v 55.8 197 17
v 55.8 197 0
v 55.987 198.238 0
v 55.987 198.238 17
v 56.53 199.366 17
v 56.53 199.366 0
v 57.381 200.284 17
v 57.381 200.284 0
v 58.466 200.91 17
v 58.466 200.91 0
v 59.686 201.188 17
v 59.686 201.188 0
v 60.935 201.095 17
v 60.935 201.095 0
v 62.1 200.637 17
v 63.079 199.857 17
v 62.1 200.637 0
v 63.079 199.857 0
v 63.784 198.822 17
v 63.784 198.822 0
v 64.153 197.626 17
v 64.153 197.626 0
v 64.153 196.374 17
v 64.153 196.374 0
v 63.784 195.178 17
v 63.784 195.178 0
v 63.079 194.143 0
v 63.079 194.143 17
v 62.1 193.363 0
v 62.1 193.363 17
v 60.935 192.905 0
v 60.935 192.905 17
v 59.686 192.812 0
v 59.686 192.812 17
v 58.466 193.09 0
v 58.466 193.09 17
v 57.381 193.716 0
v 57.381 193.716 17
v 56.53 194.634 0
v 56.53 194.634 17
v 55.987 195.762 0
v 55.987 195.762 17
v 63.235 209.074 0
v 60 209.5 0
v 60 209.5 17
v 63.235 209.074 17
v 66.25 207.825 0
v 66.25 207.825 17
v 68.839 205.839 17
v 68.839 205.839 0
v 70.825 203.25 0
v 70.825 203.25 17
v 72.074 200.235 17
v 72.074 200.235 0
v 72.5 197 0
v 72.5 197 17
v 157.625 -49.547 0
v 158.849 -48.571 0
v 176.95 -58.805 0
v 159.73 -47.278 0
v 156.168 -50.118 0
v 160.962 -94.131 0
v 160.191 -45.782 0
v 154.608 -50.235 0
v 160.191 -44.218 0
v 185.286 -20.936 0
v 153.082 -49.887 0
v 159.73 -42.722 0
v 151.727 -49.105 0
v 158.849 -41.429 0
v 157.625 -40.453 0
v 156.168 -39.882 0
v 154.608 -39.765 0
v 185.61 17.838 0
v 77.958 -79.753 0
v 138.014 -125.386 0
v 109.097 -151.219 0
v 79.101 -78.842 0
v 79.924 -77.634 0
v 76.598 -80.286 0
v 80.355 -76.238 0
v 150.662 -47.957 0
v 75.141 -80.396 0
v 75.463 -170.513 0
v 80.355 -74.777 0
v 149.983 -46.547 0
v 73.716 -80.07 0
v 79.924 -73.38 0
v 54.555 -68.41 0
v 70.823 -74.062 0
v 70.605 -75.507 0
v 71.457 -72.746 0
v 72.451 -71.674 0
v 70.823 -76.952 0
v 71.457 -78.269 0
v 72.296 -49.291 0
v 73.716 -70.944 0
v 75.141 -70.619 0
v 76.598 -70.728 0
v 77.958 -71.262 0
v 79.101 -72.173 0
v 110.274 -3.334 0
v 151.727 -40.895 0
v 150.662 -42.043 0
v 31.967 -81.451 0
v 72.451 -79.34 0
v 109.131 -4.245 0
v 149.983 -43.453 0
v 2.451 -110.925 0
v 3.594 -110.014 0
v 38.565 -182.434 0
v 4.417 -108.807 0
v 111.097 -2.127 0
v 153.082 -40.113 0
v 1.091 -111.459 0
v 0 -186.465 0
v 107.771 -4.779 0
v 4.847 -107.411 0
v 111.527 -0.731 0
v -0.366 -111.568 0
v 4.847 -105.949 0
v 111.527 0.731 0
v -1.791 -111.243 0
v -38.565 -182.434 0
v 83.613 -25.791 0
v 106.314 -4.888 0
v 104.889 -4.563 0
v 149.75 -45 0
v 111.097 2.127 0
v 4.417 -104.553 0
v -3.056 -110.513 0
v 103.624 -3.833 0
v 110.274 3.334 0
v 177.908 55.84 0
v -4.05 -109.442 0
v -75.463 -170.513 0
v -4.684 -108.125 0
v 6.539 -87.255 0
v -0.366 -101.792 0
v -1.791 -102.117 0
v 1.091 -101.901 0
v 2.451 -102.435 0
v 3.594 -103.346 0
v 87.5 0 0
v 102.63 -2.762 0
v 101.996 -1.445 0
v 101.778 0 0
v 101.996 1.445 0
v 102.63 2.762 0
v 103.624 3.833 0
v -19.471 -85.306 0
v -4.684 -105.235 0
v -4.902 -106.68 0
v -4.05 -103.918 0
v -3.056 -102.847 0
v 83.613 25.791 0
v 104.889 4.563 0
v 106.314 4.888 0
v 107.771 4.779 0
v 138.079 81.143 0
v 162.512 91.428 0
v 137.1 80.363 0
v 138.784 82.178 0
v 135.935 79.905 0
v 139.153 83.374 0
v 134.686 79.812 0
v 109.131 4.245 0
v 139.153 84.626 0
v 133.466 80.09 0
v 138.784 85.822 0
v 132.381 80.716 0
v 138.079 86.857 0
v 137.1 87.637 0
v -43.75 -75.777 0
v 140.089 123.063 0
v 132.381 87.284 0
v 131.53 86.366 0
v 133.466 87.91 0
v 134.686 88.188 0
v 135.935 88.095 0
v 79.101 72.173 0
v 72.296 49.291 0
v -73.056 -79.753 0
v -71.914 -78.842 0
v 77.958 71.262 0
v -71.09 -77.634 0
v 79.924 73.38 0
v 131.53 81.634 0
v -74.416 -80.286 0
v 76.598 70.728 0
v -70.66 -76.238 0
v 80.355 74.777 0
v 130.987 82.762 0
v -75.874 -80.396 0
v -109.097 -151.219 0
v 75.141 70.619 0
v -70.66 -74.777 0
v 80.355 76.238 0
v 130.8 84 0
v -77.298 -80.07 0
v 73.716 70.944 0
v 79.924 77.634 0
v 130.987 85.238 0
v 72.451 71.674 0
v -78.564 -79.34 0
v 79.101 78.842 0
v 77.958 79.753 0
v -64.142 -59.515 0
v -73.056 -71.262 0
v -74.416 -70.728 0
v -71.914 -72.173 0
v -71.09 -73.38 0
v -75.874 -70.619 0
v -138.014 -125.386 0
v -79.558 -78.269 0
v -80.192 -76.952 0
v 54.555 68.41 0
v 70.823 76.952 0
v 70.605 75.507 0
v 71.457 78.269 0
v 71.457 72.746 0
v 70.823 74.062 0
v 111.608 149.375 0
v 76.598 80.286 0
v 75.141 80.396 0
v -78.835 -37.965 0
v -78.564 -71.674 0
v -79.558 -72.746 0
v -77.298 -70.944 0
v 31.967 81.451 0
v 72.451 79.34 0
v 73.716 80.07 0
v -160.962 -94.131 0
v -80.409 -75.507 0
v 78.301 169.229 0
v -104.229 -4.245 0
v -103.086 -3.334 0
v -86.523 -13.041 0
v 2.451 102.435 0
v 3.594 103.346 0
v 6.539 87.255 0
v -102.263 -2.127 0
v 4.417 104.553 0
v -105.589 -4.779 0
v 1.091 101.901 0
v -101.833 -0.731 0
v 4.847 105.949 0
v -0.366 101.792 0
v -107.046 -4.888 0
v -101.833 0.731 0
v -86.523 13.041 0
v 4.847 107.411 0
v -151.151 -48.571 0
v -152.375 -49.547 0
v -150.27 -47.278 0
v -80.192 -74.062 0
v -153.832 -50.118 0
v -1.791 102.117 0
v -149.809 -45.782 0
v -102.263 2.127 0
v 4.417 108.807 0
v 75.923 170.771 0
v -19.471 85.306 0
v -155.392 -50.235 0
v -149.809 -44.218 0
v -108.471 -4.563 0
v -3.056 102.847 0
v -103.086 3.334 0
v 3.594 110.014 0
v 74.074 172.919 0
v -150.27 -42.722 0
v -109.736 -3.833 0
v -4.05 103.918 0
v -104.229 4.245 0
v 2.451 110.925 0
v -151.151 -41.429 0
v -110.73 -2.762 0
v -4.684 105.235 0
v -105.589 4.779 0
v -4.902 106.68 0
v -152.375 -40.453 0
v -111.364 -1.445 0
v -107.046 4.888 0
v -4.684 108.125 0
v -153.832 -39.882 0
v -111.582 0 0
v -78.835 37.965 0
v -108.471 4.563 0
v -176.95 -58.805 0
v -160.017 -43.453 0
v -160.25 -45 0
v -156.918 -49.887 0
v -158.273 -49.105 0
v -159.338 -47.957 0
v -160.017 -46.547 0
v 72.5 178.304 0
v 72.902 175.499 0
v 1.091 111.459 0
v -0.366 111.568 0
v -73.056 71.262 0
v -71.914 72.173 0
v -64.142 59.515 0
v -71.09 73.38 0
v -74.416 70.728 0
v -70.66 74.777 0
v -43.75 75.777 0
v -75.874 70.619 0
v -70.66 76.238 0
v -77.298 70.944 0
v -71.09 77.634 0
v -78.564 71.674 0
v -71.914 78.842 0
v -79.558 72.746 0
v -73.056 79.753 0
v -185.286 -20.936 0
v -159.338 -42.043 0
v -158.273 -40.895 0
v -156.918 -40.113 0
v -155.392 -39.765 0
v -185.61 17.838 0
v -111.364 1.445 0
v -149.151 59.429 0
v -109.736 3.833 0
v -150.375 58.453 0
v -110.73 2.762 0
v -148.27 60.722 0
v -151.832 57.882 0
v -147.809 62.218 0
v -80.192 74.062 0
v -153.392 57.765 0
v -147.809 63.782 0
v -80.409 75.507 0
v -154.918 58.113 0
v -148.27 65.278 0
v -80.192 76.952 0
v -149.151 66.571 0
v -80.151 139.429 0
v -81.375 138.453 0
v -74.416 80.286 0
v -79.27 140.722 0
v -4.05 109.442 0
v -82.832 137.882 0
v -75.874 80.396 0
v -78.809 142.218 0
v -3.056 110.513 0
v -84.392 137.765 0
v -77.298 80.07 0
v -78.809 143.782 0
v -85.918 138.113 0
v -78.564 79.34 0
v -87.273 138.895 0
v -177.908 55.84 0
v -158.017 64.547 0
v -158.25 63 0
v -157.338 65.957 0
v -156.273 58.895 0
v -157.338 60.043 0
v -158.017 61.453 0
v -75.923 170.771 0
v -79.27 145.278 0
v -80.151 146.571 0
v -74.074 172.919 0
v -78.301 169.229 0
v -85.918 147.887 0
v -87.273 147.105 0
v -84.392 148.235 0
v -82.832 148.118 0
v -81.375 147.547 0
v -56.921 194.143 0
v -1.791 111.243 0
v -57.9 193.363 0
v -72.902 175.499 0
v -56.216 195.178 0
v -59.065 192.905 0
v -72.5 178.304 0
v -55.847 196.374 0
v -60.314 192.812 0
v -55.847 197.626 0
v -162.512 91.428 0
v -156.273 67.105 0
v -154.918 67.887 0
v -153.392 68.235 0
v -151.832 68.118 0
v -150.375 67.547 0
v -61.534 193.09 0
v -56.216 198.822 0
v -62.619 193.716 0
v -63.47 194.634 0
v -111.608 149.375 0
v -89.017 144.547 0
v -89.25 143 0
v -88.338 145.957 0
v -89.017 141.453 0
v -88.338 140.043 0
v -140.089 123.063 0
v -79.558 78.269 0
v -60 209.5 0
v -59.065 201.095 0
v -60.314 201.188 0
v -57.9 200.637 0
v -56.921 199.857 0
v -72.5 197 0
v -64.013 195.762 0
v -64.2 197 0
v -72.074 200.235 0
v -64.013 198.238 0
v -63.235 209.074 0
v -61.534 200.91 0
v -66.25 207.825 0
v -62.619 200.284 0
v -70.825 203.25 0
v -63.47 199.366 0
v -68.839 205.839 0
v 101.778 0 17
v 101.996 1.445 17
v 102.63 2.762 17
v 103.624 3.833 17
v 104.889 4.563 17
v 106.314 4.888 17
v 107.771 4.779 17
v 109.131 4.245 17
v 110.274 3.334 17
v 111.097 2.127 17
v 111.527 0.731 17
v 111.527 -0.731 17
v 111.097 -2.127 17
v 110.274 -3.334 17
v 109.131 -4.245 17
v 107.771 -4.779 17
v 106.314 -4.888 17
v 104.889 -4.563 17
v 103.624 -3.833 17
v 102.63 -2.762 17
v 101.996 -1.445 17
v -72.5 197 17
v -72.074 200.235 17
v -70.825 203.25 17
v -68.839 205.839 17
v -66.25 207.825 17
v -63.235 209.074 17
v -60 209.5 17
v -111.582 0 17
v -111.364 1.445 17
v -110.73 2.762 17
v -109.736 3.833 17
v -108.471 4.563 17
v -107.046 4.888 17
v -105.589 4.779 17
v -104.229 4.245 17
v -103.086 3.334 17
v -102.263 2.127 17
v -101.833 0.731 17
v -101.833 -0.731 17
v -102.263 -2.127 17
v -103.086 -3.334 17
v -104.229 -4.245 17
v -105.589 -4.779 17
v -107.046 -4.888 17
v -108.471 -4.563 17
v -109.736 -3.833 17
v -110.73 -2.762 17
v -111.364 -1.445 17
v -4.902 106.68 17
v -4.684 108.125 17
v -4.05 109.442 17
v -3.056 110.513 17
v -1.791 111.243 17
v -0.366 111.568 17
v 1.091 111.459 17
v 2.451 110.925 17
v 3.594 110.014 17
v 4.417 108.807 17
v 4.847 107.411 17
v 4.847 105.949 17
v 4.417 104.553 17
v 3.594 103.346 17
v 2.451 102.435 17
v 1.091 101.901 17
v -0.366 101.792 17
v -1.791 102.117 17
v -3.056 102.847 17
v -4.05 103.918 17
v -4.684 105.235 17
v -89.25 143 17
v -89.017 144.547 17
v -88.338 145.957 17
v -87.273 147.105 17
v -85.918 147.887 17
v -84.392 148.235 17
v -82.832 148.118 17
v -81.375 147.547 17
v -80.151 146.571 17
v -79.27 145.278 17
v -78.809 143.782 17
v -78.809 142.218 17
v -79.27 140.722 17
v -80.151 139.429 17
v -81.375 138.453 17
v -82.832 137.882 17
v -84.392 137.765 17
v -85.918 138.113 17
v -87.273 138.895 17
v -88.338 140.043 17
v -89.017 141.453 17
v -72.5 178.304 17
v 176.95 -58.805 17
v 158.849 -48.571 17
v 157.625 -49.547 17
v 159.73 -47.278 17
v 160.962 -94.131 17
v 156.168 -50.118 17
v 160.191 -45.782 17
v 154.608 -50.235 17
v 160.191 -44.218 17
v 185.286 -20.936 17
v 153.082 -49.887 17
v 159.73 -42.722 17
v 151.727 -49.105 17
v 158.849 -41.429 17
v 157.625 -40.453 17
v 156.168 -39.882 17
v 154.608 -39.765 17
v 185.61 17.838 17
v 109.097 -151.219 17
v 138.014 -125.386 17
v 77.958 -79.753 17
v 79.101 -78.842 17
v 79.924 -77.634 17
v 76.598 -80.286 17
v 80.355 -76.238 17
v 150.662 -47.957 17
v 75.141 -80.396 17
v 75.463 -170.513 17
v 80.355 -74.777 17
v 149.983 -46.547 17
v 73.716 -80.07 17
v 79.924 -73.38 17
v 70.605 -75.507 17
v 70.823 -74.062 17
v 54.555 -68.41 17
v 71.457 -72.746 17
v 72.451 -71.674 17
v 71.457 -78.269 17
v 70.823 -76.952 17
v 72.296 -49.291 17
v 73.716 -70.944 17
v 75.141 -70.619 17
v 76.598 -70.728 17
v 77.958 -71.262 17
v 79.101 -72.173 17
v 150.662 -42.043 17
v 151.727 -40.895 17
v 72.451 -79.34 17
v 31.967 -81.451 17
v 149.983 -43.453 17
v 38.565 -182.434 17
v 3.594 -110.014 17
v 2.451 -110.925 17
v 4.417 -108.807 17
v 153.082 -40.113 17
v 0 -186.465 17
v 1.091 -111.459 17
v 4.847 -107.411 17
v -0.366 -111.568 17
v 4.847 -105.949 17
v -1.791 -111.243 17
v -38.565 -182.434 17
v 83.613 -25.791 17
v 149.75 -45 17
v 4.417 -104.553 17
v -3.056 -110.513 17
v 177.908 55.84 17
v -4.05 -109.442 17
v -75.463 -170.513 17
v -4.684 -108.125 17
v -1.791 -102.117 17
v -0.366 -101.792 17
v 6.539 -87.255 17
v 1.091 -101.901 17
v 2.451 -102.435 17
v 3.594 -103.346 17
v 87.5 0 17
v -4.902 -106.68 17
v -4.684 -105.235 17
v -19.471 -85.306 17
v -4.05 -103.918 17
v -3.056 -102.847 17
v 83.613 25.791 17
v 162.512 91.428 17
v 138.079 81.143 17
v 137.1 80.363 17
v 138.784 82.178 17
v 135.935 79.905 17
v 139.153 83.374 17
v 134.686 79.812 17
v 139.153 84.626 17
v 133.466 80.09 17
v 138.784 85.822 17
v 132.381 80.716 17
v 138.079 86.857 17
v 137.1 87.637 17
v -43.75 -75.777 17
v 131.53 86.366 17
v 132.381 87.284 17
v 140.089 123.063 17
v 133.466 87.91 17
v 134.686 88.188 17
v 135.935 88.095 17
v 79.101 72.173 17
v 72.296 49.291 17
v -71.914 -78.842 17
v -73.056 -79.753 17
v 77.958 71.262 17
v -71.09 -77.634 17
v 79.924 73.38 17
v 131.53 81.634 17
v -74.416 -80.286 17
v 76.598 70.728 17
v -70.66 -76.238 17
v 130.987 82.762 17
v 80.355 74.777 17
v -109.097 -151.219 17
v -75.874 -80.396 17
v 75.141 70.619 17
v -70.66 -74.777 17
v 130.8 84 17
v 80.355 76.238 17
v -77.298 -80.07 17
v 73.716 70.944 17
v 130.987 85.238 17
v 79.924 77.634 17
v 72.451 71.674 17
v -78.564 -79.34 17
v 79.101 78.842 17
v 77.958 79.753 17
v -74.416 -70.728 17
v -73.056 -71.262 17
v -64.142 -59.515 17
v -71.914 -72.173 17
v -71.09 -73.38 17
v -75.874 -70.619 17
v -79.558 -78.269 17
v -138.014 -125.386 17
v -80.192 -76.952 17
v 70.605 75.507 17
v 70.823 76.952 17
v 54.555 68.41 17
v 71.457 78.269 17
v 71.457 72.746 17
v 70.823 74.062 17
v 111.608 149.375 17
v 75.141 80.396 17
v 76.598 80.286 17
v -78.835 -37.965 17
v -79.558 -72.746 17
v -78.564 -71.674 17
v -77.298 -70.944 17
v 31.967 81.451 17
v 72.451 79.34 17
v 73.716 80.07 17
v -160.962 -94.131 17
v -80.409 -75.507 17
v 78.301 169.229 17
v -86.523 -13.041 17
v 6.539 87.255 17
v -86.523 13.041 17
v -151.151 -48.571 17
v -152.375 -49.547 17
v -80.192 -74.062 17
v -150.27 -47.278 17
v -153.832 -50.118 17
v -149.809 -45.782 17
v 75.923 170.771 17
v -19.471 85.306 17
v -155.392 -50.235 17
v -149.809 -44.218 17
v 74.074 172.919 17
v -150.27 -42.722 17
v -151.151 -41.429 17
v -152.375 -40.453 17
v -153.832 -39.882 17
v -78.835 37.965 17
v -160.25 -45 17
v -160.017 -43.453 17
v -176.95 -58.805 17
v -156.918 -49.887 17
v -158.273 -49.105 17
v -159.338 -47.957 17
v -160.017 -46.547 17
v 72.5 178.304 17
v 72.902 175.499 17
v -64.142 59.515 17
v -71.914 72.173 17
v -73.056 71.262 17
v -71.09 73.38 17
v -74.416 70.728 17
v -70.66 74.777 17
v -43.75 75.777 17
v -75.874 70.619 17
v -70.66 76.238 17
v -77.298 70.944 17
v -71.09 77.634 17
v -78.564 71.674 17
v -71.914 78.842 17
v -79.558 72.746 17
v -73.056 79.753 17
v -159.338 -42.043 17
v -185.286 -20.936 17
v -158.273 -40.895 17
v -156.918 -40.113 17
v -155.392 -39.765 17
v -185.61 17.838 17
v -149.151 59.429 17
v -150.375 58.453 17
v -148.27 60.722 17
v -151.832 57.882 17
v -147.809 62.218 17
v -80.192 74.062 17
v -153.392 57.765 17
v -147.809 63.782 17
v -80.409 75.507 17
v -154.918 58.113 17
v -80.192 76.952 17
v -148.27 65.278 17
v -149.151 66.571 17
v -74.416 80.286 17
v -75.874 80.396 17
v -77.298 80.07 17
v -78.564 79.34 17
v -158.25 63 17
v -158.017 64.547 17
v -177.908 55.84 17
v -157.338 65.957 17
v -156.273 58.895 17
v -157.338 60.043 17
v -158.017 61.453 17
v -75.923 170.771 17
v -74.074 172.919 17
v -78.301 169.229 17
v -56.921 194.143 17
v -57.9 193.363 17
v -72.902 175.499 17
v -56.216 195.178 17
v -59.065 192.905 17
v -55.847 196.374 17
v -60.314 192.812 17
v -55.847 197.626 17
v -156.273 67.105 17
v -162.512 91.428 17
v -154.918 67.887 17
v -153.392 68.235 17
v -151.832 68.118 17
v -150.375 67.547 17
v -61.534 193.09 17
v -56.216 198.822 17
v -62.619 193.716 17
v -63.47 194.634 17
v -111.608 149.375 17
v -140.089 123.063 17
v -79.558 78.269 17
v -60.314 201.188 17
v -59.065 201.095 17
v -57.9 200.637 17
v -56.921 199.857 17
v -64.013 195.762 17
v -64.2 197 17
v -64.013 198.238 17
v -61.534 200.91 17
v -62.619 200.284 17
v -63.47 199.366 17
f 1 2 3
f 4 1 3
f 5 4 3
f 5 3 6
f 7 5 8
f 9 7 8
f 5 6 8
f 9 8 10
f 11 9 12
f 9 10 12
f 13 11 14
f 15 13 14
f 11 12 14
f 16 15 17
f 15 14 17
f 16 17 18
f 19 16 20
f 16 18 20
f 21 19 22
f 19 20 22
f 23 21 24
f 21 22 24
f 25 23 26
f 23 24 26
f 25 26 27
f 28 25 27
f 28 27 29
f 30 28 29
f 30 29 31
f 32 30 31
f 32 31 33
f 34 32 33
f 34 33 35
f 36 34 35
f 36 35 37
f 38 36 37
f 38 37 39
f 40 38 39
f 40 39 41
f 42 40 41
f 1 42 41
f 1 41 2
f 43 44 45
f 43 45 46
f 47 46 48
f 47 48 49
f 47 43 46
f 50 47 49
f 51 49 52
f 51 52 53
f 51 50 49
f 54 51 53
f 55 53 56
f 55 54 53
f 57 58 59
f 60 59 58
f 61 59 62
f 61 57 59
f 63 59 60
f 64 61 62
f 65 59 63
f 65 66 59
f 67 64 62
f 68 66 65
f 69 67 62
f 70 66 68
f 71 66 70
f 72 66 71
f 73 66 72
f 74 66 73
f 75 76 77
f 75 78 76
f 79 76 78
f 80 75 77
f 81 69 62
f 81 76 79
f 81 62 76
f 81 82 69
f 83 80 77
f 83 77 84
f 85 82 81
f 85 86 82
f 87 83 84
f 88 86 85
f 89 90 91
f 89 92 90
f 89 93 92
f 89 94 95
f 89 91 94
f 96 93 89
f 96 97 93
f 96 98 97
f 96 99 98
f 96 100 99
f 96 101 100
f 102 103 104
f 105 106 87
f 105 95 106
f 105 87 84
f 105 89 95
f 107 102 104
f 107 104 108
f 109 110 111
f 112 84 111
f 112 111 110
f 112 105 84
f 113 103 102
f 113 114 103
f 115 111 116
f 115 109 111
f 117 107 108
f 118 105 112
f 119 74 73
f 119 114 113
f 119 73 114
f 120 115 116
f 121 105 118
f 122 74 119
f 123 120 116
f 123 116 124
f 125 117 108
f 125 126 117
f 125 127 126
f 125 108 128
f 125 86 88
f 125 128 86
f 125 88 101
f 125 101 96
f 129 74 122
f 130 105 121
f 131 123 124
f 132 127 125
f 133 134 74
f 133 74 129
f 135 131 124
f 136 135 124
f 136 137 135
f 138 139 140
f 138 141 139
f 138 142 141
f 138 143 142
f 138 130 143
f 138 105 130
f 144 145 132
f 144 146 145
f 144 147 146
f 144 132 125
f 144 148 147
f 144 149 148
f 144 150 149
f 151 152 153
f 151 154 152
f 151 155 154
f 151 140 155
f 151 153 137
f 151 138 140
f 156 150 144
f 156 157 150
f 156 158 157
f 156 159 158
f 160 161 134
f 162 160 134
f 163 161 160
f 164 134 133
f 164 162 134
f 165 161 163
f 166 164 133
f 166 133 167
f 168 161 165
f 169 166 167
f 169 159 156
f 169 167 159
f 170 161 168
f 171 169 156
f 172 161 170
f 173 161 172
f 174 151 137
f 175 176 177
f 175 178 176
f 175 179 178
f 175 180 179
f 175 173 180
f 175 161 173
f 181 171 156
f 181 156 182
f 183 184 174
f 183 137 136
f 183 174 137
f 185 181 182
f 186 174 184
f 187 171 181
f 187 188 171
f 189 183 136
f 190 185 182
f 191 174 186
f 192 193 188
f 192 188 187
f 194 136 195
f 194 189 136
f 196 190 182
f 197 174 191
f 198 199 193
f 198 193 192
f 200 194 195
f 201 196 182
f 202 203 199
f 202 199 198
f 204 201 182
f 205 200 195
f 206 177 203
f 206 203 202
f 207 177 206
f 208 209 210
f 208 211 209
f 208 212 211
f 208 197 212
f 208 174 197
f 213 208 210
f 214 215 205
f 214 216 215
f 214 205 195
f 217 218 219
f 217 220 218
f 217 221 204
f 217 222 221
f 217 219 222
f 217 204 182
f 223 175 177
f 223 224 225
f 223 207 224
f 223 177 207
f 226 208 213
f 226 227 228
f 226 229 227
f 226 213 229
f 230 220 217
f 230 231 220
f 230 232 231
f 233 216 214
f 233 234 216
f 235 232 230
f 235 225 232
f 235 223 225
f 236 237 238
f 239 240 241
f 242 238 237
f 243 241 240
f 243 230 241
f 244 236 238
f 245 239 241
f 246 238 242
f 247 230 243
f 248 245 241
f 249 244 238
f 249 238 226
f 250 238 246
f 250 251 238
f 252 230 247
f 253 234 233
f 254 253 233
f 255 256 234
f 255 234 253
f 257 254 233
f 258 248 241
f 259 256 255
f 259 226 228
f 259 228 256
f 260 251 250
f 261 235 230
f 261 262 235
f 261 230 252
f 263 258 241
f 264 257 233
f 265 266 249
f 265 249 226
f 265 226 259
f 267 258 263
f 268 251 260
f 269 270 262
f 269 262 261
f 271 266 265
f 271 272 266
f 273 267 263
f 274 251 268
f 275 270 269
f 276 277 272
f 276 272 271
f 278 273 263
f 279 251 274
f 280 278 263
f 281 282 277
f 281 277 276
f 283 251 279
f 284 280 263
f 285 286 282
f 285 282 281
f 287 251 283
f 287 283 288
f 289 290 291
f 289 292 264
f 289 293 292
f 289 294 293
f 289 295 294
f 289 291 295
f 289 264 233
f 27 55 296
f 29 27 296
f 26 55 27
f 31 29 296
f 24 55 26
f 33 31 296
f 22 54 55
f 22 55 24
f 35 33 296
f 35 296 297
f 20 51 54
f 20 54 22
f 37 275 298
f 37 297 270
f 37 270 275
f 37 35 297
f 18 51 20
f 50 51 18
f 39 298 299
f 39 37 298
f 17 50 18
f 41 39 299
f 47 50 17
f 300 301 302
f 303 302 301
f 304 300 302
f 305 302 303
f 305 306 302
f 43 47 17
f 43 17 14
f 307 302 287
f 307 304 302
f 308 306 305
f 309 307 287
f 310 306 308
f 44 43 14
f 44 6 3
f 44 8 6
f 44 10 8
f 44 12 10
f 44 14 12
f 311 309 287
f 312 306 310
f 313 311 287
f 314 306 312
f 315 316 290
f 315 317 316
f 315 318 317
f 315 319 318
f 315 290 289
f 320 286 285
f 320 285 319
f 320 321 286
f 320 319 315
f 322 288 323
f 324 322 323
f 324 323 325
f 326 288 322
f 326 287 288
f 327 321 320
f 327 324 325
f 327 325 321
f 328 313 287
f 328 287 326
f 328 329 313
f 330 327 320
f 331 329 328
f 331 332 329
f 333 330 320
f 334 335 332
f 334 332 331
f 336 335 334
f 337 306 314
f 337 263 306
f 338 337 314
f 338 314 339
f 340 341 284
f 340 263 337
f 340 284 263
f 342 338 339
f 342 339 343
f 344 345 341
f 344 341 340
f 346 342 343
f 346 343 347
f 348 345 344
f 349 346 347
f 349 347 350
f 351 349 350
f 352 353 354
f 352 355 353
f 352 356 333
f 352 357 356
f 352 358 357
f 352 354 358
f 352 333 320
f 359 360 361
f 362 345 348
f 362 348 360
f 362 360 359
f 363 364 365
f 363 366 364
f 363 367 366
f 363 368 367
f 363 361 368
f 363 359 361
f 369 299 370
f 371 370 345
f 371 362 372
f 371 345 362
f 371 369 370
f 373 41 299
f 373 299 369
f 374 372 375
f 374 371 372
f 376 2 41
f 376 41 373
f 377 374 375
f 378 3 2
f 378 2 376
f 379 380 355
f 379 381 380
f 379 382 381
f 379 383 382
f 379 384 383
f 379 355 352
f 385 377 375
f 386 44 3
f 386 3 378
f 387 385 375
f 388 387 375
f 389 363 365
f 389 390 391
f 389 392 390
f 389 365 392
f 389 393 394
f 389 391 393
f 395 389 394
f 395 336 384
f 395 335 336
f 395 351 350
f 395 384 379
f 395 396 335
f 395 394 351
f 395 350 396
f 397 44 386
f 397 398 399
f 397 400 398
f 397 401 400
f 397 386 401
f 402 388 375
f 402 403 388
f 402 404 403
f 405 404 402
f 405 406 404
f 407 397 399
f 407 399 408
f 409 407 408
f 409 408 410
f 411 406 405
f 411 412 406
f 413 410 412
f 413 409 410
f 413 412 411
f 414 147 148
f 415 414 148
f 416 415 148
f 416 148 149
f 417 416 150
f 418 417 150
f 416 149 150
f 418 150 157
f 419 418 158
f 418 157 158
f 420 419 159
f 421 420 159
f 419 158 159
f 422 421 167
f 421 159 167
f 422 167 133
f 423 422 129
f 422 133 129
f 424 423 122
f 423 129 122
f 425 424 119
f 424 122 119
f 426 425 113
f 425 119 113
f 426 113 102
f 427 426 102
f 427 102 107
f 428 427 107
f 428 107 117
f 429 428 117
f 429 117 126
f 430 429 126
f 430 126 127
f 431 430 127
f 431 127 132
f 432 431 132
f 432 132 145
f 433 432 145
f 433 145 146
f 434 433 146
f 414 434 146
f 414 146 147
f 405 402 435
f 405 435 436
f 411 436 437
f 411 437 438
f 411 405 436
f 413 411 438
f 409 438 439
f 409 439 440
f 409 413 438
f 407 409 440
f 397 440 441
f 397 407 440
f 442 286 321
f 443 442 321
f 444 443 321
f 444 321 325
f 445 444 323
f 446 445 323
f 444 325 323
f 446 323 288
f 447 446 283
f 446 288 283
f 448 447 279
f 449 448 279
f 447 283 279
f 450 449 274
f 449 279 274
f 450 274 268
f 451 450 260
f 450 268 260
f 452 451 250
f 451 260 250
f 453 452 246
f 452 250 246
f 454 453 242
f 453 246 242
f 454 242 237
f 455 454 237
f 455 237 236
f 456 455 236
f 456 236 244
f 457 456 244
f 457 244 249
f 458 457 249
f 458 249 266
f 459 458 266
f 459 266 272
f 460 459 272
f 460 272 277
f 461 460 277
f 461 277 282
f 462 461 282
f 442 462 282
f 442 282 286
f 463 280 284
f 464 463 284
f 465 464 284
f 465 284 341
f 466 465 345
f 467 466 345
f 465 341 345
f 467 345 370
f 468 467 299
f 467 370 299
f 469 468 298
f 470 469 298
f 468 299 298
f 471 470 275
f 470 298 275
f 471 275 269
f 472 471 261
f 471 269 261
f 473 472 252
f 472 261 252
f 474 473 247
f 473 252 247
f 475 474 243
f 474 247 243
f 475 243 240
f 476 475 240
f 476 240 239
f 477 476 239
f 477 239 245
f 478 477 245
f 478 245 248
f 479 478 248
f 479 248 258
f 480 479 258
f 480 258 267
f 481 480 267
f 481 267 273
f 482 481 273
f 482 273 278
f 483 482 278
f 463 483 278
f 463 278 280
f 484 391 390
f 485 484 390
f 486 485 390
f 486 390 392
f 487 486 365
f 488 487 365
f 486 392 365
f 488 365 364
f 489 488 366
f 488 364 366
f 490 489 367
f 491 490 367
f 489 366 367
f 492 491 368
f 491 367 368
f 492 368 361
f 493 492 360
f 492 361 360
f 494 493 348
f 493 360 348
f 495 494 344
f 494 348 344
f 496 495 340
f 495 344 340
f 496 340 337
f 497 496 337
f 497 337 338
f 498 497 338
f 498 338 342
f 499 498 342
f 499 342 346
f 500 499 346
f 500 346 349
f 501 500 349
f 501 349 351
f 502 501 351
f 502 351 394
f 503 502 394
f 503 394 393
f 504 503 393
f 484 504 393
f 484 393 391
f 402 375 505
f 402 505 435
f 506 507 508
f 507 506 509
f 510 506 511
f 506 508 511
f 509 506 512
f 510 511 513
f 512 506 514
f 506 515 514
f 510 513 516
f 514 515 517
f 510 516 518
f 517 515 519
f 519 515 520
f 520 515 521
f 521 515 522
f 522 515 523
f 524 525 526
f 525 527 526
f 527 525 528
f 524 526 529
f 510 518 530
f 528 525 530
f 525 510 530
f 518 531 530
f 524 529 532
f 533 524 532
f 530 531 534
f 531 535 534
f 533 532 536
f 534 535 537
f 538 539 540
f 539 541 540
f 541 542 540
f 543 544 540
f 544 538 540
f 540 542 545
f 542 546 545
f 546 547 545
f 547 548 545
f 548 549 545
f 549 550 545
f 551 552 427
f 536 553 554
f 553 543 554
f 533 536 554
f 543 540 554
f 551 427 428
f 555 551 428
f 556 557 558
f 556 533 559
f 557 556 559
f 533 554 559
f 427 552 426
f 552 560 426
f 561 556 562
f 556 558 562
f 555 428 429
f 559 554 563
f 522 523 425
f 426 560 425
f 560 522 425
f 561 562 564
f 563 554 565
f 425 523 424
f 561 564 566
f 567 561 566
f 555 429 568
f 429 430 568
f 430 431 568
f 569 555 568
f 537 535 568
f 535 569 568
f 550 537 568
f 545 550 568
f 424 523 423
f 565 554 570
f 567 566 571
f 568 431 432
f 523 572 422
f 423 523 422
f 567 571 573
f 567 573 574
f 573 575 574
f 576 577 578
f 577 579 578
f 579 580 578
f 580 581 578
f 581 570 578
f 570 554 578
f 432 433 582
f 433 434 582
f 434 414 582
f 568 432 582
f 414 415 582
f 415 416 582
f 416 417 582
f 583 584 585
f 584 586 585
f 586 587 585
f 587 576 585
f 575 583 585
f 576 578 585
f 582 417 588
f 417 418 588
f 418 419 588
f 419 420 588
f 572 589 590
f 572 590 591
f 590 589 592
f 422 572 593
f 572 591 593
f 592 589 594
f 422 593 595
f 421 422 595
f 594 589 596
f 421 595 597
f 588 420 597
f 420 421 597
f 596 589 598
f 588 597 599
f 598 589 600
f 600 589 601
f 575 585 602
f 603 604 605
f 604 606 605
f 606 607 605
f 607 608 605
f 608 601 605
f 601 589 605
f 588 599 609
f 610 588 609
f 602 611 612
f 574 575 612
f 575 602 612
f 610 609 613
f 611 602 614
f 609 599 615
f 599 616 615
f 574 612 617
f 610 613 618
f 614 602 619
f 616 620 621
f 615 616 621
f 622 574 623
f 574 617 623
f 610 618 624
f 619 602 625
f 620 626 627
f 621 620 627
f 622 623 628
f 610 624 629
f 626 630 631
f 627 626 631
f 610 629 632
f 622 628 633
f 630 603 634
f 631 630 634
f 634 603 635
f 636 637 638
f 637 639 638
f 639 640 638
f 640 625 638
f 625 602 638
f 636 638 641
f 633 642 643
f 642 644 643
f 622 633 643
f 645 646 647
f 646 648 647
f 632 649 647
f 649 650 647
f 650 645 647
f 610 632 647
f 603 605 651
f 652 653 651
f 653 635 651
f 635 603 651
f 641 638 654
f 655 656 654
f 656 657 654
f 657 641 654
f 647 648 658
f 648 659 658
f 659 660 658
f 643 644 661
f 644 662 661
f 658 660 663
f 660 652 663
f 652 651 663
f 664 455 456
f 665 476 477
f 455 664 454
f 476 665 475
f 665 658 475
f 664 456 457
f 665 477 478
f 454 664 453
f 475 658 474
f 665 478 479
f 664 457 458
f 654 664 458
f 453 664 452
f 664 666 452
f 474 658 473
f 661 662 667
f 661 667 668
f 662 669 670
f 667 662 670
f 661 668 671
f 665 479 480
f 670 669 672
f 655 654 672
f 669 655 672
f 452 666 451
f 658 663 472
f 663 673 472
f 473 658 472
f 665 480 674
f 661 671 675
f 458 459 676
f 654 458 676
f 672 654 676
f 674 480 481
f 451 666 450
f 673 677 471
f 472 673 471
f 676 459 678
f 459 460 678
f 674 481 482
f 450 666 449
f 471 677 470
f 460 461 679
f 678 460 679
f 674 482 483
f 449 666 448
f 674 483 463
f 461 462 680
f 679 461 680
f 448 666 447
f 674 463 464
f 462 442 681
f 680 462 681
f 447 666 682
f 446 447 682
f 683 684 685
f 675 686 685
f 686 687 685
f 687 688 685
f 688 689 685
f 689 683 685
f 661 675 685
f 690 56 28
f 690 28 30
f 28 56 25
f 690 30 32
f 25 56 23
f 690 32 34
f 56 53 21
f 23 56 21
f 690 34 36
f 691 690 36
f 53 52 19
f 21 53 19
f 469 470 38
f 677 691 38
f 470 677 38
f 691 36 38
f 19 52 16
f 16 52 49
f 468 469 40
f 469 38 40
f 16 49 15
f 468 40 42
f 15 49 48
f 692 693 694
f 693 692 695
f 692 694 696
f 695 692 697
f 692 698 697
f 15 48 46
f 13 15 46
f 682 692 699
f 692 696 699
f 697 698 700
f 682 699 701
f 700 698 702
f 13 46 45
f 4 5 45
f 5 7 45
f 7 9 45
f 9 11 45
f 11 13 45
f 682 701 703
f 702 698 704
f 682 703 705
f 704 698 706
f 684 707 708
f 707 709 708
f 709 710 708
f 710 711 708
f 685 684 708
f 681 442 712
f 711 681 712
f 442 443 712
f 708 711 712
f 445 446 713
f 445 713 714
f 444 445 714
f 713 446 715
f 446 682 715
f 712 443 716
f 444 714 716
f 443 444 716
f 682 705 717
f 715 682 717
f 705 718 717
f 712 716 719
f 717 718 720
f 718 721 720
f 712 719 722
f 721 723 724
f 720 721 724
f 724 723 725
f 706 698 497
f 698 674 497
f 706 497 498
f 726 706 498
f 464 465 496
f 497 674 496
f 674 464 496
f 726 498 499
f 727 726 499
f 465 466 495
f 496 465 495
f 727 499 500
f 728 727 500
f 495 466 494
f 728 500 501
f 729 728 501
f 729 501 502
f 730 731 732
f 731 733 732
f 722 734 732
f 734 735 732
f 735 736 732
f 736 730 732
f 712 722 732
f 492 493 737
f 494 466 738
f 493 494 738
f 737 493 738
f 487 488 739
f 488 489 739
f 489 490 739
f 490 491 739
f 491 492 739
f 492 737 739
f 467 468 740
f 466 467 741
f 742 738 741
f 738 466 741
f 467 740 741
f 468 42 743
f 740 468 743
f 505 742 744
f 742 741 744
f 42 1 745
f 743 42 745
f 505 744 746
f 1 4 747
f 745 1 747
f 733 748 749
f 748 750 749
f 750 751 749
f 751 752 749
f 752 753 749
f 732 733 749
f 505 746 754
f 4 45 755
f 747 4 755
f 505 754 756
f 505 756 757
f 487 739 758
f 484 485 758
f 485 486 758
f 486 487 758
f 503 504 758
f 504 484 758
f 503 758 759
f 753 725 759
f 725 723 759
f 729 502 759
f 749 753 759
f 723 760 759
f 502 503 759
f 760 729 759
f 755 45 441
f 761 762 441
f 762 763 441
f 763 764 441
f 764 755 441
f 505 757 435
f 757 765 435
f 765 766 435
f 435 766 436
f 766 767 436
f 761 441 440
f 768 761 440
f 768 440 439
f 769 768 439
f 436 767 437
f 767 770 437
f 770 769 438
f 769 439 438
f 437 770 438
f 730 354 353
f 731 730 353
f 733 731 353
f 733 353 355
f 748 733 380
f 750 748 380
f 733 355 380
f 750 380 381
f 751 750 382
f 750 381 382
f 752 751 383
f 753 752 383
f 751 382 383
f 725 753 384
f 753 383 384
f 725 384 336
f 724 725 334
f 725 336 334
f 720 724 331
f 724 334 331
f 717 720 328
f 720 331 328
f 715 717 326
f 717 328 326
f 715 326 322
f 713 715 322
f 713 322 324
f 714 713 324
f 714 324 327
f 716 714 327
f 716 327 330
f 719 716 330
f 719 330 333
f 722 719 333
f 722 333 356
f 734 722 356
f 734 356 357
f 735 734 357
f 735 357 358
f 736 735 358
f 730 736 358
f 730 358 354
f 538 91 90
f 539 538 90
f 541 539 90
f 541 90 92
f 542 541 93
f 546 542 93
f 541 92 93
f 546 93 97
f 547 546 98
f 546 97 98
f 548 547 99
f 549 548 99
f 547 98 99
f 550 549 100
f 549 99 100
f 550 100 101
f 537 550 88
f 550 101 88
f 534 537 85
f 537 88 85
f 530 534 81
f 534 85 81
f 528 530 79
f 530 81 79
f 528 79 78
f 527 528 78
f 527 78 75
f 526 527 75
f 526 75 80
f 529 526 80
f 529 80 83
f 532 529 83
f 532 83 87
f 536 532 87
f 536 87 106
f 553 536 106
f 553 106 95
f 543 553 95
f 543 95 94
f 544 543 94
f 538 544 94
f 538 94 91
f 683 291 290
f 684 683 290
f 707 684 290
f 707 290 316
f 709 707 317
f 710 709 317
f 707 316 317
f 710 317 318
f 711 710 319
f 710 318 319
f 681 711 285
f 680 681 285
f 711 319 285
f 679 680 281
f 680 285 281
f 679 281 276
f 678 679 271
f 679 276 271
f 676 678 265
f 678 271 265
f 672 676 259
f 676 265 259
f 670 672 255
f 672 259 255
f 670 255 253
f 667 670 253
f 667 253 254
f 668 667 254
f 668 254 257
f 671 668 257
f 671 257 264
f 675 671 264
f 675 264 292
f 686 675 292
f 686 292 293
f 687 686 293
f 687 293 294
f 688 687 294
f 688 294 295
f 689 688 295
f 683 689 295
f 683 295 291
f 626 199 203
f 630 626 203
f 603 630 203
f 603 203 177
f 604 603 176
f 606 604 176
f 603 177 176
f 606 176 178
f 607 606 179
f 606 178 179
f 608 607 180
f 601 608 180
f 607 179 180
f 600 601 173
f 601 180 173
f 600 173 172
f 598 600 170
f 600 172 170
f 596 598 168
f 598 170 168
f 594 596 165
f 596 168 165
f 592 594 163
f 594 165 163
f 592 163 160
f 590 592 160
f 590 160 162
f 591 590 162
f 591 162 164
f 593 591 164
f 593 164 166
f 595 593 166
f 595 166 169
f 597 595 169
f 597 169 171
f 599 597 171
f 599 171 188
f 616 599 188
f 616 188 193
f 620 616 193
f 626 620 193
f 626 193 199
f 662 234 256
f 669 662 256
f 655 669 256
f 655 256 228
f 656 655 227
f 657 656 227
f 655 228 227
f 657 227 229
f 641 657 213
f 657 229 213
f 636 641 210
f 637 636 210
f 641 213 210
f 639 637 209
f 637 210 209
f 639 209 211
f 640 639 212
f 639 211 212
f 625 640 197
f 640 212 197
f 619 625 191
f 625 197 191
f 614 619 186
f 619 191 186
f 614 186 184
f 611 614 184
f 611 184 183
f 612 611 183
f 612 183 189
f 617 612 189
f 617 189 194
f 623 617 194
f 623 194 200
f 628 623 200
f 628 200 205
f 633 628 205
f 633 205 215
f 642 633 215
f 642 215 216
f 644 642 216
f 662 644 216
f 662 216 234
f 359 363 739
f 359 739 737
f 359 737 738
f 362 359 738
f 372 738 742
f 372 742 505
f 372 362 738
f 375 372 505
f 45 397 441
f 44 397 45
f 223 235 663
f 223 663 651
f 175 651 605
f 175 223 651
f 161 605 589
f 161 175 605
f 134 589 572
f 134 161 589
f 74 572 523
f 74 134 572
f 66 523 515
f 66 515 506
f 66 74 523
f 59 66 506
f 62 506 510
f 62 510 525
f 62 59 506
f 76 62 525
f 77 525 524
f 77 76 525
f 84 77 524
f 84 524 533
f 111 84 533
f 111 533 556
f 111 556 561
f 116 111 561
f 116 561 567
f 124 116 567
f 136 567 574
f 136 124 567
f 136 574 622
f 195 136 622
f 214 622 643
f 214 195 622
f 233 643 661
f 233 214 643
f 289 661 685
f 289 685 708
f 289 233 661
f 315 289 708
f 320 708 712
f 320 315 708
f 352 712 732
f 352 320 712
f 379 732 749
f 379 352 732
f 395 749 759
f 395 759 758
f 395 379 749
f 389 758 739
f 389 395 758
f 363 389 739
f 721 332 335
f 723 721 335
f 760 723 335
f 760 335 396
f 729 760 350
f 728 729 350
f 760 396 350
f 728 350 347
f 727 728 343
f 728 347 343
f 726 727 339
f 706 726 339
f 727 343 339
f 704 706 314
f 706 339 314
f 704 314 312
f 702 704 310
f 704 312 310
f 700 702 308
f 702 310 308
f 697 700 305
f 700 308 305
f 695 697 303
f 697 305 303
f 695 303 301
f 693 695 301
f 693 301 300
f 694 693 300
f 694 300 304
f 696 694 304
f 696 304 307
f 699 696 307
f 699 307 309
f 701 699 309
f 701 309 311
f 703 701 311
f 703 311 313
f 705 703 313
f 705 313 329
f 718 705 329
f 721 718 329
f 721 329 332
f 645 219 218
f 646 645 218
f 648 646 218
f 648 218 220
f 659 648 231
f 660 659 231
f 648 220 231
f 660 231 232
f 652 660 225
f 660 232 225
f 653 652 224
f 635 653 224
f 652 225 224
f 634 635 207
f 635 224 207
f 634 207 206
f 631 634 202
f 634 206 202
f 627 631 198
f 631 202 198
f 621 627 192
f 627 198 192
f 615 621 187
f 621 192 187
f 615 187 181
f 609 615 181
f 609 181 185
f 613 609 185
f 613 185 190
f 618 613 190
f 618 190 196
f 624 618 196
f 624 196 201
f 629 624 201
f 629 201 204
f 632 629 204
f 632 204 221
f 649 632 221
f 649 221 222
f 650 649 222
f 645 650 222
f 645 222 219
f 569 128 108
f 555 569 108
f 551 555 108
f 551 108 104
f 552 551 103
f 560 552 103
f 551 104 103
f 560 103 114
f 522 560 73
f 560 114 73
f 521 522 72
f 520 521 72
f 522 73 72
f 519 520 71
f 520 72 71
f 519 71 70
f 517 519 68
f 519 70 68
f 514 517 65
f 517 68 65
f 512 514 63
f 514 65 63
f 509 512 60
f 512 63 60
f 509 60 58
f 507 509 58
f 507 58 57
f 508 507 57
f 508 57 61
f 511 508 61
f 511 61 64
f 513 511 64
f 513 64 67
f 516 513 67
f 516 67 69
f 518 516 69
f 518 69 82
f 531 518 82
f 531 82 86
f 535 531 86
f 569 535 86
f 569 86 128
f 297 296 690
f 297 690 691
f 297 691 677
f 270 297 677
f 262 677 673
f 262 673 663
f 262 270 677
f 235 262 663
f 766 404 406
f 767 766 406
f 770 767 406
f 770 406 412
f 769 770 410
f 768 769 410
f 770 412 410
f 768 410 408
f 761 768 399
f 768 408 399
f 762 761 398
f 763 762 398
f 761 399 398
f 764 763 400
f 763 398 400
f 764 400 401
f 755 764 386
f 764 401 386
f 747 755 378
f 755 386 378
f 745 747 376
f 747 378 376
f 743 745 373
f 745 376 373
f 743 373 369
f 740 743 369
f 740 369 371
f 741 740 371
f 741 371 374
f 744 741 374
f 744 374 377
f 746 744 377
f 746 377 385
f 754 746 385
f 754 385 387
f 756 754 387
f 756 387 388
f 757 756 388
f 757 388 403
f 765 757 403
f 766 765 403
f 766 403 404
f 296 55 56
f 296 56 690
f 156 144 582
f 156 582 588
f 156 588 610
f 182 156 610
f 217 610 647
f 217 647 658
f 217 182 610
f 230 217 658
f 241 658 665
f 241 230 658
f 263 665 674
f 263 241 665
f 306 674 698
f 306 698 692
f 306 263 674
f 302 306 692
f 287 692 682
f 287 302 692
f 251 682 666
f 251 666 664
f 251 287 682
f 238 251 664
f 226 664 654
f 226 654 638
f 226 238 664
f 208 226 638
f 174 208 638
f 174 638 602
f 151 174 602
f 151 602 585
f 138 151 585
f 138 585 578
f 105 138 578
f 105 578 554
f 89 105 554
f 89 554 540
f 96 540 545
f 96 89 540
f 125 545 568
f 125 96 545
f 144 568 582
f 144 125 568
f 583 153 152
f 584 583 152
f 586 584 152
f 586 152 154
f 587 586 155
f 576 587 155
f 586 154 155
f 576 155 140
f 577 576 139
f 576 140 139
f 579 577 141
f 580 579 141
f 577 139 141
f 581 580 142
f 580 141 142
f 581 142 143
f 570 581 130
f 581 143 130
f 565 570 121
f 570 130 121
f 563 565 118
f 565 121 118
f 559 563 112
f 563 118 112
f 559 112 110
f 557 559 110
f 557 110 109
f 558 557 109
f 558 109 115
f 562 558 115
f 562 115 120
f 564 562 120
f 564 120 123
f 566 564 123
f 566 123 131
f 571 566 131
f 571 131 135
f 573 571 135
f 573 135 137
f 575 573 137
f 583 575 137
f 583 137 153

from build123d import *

# Parameters (mm, degrees)
SKETCH1_R                   = 4.5
SKETCH1_R_2                 = 4
SKETCH1_R_3                 = 3.5
SKETCH1_R_4                 = 87.5
BOSS_EXTRUDE1_DEPTH         = 17
F_3_8_CLEARANCE_HOLE1_D     = 9.8044
F_3_8_CLEARANCE_HOLE1_DEPTH = 51.26
F_3_8_CLEARANCE_HOLE1_TIP   = 2.945538927
M10_CLEARANCE_HOLE1_D       = 10.5
M10_CLEARANCE_HOLE1_DEPTH   = 51.26
M10_CLEARANCE_HOLE1_TIP     = 3.15451825
M8_CLEARANCE_HOLE1_D        = 8.4
M8_CLEARANCE_HOLE1_DEPTH    = 51.26
M8_CLEARANCE_HOLE1_TIP      = 2.5236146


with BuildPart() as part:
    # Sketch1 → Boss-Extrude1 (new body)
    with BuildSketch(Plane.XY):
        with BuildLine():
            Line((-60, 209.5), (60, 209.5))
            ThreePointArc((60, 209.5), (68.838834765, 205.838834765), (72.5, 197))
            Line((72.5, 197), (72.5, 178.304283367))
            ThreePointArc((72.5, 178.304283367), (74.07408405, 172.918752715), (78.30078808, 169.228677643))
            ThreePointArc((78.30078808, 169.228677643), (0, -186.465435807), (-78.30078808, 169.228677643))
            ThreePointArc((-78.30078808, 169.228677643), (-74.07408405, 172.918752715), (-72.5, 178.304283367))
            Line((-72.5, 178.304283367), (-72.5, 197))
            ThreePointArc((-72.5, 197), (-68.838834765, 205.838834765), (-60, 209.5))
        make_face()
        with Locations((-84, 143)):
            Circle(SKETCH1_R, mode=Mode.SUBTRACT)
        with Locations((-60, 197)):
            Circle(SKETCH1_R_2, mode=Mode.SUBTRACT)
        with Locations((60, 197)):
            Circle(SKETCH1_R_3, mode=Mode.SUBTRACT)
        with Locations((135, 84)):
            Circle(SKETCH1_R_3, mode=Mode.SUBTRACT)
        with Locations((155, -45)):
            Circle(SKETCH1_R, mode=Mode.SUBTRACT)
        with Locations((-155, -45)):
            Circle(SKETCH1_R, mode=Mode.SUBTRACT)
        Circle(SKETCH1_R_4, mode=Mode.SUBTRACT)
        with Locations((-153, 63)):
            Circle(SKETCH1_R, mode=Mode.SUBTRACT)
    extrude(amount=BOSS_EXTRUDE1_DEPTH)

    # 3/8 Clearance Hole1
    with Locations(Plane(origin=(75.50716213, 75.50716213, 17), x_dir=(1, 0, 0), z_dir=(0, 0, 1))):
        with Locations((0, 0), (0, -151.01432426), (-151.01432426, -151.01432426), (-151.01432426, 0), (-75.50716213, 31.17283787), (31.17283787, -75.50716213), (-182.18716213, -75.50716213), (-75.50716213, -182.18716213)):
            Hole(F_3_8_CLEARANCE_HOLE1_D / 2, depth=F_3_8_CLEARANCE_HOLE1_DEPTH)
            with Locations((0, 0, -(F_3_8_CLEARANCE_HOLE1_DEPTH + F_3_8_CLEARANCE_HOLE1_TIP / 2))):  # 118° drill point
                Cone(0, F_3_8_CLEARANCE_HOLE1_D / 2, F_3_8_CLEARANCE_HOLE1_TIP, mode=Mode.SUBTRACT)

    # M10 Clearance Hole1
    with Locations(Plane(origin=(155, -45, 17), x_dir=(1, 0, 0), z_dir=(0, 0, 1))):
        with Locations((0, 0), (-310, 0), (-308, 108), (-239, 188)):
            Hole(M10_CLEARANCE_HOLE1_D / 2, depth=M10_CLEARANCE_HOLE1_DEPTH)
            with Locations((0, 0, -(M10_CLEARANCE_HOLE1_DEPTH + M10_CLEARANCE_HOLE1_TIP / 2))):  # 118° drill point
                Cone(0, M10_CLEARANCE_HOLE1_D / 2, M10_CLEARANCE_HOLE1_TIP, mode=Mode.SUBTRACT)

    # M8 Clearance Hole1
    with Locations(Plane(origin=(-60, 197, 17), x_dir=(1, 0, 0), z_dir=(0, 0, 1))):
        with Locations((0, 0), (120, 0), (195, -113)):
            Hole(M8_CLEARANCE_HOLE1_D / 2, depth=M8_CLEARANCE_HOLE1_DEPTH)
            with Locations((0, 0, -(M8_CLEARANCE_HOLE1_DEPTH + M8_CLEARANCE_HOLE1_TIP / 2))):  # 118° drill point
                Cone(0, M8_CLEARANCE_HOLE1_D / 2, M8_CLEARANCE_HOLE1_TIP, mode=Mode.SUBTRACT)


solid = part.part
